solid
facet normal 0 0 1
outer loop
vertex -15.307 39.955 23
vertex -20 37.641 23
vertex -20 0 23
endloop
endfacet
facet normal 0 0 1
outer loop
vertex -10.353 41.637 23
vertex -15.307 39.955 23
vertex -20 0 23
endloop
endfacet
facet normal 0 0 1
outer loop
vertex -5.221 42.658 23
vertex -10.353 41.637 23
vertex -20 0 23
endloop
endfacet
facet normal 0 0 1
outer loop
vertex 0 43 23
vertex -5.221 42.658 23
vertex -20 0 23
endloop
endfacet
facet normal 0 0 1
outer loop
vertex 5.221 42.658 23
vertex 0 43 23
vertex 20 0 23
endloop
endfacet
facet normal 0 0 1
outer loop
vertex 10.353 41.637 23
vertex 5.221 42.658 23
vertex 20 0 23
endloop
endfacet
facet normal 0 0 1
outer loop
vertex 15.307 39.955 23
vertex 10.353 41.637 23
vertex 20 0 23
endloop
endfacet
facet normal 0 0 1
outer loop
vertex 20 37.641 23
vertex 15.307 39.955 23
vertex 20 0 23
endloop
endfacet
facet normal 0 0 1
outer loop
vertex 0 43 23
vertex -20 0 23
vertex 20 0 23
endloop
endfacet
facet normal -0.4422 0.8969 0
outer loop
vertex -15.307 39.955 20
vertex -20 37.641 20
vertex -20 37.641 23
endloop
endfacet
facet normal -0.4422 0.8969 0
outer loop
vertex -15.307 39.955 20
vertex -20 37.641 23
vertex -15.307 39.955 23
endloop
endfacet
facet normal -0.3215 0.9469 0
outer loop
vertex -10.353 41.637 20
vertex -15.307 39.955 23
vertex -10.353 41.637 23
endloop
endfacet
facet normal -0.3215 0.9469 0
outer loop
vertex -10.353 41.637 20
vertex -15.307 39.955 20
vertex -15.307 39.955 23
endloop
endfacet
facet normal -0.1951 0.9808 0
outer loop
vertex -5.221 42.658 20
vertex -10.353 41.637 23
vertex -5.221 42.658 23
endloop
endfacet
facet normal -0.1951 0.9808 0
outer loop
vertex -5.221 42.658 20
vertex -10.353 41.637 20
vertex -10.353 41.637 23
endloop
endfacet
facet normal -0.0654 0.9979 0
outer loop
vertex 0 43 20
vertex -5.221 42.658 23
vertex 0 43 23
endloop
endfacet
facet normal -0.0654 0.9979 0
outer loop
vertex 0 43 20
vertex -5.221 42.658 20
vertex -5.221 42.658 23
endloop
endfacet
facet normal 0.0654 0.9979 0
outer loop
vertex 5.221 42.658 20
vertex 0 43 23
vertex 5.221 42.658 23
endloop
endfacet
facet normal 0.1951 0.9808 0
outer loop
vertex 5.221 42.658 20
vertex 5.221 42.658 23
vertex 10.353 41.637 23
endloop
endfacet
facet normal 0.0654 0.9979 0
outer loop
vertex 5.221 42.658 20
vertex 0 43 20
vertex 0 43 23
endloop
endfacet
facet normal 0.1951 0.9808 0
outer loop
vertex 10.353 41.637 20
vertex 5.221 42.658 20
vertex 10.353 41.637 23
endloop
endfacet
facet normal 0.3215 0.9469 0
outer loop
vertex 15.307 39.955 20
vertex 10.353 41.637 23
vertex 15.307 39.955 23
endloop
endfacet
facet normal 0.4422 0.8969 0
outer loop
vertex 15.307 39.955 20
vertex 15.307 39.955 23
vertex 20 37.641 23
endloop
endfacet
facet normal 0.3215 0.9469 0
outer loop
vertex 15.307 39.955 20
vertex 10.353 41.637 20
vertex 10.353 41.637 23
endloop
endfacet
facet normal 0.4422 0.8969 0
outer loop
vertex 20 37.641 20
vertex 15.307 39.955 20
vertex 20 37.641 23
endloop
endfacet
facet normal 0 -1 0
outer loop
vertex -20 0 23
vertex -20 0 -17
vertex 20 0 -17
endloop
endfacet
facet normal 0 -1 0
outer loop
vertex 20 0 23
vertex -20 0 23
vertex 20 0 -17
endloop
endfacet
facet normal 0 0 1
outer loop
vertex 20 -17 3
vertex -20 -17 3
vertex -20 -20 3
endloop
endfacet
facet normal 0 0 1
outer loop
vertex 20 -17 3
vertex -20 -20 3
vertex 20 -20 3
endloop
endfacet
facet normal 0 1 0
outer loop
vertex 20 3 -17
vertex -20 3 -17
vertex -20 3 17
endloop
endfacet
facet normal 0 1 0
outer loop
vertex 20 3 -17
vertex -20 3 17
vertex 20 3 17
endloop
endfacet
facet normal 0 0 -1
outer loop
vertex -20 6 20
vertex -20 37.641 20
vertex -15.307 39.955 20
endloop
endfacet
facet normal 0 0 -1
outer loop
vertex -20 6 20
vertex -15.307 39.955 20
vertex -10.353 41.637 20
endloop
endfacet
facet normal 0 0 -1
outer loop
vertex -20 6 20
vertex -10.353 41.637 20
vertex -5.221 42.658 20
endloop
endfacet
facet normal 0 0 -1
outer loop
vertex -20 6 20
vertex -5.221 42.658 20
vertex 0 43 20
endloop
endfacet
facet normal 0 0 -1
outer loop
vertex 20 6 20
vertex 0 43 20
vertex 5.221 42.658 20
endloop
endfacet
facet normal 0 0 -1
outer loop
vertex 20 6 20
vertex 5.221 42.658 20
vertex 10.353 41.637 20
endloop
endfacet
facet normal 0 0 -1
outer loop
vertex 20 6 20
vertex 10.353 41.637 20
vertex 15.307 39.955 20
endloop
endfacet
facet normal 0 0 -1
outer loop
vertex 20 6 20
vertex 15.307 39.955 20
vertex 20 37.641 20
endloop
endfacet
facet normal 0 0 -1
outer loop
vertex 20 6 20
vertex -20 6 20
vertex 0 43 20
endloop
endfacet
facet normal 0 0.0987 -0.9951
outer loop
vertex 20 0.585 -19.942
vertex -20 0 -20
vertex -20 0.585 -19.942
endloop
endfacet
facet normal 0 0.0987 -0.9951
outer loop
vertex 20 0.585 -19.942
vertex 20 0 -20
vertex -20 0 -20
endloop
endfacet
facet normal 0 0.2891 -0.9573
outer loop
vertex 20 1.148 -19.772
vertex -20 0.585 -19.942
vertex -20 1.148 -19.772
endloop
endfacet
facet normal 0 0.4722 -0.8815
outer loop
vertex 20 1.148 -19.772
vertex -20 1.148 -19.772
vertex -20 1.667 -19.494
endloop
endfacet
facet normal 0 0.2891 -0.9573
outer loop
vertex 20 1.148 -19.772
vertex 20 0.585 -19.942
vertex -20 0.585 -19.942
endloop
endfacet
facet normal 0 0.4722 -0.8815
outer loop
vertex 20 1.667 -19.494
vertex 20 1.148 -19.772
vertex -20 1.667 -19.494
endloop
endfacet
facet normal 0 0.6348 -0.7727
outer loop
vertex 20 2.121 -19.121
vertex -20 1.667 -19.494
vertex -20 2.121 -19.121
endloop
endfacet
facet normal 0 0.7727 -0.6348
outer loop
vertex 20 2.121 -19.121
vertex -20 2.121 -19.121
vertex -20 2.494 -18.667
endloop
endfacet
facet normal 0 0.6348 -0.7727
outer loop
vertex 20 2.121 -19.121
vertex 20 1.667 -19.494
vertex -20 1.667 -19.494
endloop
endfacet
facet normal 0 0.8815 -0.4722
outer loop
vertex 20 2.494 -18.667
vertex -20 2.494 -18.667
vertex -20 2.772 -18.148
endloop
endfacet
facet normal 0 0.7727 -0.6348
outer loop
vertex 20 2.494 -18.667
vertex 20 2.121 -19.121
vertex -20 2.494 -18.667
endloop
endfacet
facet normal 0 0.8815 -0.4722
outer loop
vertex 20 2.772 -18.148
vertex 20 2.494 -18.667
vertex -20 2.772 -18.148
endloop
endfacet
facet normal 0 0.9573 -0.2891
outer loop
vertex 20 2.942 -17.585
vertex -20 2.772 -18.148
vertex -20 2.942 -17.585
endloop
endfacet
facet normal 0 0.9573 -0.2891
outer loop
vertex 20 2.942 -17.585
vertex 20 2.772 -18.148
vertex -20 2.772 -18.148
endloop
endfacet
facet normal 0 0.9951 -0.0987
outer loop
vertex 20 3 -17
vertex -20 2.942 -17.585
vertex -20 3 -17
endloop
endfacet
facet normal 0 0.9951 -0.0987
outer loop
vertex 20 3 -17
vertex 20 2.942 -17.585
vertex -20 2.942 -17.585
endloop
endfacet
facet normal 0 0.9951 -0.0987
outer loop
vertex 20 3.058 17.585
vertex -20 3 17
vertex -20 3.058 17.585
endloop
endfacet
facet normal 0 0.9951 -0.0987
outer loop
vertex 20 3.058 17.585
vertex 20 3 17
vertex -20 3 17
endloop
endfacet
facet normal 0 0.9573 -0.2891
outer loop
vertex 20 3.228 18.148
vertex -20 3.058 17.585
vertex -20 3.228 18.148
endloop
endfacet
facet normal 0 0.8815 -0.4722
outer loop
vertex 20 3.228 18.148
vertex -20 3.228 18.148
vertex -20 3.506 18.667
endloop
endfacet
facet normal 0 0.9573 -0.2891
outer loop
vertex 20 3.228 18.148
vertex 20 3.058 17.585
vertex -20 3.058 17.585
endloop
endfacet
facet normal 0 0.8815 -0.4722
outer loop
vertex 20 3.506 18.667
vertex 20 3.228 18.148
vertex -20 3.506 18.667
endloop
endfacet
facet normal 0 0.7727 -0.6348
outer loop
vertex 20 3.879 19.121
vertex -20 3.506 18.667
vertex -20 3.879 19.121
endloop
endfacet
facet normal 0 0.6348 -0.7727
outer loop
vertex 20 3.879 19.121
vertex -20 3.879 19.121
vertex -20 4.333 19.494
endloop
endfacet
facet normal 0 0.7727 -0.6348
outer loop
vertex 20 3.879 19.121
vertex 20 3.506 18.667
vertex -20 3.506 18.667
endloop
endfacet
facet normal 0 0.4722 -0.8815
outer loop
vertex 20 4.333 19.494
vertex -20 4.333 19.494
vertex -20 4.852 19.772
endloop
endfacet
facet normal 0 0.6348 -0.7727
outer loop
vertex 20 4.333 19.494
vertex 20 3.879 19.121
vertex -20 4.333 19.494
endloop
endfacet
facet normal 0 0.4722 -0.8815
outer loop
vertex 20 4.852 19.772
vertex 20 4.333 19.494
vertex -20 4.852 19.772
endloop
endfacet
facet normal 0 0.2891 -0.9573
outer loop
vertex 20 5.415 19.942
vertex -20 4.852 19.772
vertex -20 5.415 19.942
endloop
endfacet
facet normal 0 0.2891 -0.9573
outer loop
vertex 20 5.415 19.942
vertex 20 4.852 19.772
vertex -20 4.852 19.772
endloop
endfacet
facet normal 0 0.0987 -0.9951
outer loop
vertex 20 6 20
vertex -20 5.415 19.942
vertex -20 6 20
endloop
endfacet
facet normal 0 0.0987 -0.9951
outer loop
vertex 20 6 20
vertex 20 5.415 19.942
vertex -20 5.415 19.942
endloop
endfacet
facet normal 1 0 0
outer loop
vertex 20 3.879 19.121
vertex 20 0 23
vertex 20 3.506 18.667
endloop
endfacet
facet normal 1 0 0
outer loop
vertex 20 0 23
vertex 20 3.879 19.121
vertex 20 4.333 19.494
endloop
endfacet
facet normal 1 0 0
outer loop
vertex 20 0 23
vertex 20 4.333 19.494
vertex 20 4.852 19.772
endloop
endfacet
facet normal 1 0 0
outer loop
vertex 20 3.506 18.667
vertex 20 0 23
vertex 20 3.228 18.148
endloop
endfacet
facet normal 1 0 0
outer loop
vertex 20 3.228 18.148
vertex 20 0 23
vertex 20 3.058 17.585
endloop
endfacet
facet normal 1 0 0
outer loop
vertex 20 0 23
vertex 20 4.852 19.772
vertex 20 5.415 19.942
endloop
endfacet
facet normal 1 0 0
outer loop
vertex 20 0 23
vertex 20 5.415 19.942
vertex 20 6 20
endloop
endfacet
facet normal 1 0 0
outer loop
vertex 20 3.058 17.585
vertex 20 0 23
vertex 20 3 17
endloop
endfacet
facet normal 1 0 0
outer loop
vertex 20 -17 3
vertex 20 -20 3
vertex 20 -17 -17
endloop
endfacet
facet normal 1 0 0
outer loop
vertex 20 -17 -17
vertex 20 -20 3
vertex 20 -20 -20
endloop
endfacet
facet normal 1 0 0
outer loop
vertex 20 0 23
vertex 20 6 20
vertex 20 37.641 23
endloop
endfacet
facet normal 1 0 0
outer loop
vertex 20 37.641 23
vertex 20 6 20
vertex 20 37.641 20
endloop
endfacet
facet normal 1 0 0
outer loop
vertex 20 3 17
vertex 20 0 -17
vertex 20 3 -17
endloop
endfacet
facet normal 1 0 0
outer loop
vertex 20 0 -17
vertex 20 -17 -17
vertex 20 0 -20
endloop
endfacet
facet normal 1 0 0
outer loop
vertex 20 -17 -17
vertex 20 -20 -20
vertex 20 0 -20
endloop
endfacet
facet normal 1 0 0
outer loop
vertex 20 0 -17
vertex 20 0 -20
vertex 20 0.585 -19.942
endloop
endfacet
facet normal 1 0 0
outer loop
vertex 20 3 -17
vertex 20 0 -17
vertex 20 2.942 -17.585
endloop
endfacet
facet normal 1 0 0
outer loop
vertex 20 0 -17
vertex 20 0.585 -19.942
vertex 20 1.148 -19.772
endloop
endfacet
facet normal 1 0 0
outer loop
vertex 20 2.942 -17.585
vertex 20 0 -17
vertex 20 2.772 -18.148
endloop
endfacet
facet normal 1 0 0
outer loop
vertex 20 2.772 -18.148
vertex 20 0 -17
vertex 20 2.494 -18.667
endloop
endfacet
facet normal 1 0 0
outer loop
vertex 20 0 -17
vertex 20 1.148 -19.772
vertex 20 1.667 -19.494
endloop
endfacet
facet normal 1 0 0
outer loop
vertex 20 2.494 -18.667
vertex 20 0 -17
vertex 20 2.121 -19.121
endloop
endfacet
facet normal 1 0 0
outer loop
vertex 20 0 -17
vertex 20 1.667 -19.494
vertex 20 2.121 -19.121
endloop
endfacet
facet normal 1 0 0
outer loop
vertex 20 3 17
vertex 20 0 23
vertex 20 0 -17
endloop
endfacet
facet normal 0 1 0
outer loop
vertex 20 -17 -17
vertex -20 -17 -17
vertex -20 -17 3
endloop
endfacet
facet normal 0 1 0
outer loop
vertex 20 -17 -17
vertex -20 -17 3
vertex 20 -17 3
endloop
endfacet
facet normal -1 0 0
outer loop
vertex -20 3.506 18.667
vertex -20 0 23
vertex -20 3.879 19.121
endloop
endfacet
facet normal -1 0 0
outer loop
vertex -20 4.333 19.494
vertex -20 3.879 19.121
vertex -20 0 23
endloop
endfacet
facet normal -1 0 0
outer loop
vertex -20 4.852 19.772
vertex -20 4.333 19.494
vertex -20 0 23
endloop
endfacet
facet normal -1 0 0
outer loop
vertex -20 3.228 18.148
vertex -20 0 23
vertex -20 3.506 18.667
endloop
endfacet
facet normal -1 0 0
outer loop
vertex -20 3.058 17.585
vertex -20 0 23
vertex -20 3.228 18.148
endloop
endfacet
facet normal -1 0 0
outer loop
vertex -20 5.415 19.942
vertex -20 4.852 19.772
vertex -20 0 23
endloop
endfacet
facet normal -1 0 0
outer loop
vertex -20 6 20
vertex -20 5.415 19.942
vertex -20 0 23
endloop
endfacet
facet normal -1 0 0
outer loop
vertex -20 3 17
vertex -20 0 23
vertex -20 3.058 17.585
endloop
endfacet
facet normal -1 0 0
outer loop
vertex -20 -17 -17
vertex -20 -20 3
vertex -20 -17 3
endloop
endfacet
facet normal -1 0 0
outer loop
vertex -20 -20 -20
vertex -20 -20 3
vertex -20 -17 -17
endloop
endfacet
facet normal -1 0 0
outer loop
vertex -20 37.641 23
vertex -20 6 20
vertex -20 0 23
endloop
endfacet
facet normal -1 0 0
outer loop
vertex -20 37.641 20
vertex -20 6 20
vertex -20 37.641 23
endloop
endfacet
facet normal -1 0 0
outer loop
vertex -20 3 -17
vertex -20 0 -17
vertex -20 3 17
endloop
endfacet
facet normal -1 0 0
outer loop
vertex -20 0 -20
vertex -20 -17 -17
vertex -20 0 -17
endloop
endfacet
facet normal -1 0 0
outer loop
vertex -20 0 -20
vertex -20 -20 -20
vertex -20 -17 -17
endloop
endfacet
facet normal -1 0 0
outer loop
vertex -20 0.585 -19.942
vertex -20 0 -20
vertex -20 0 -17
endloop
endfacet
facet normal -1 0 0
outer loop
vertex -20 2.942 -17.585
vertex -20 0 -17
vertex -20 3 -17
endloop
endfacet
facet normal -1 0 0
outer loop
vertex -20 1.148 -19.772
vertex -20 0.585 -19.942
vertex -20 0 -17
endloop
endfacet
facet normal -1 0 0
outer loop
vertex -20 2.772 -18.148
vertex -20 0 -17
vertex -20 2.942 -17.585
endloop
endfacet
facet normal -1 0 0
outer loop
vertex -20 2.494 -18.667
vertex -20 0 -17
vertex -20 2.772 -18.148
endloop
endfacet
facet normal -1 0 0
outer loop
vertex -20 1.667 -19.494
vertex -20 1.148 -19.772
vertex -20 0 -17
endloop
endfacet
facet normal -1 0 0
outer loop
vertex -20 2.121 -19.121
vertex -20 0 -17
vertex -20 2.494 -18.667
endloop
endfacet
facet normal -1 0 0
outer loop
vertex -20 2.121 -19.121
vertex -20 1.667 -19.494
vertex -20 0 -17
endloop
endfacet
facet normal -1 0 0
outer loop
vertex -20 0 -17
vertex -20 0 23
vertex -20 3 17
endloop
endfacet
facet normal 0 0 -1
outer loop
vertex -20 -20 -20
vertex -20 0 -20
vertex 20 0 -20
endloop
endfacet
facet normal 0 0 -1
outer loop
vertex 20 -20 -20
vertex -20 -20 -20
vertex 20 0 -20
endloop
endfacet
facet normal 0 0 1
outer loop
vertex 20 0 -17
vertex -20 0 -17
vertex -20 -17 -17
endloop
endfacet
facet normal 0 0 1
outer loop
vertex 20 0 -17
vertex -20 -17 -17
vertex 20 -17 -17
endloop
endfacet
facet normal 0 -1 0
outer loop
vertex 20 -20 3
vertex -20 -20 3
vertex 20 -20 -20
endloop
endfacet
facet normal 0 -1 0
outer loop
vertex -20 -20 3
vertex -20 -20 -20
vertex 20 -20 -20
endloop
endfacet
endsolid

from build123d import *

# Parameters (mm, degrees)
SKETCH1_W           = 40
SKETCH1_H           = 40
BOSS_EXTRUDE1_DEPTH = 3
SKETCH2_W           = 40
SKETCH2_H           = 3
BOSS_EXTRUDE2_DEPTH = 53
SKETCH3_W           = 40
SKETCH3_H           = 3
BOSS_EXTRUDE3_DEPTH = 20
CUT_EXTRUDE1_REACH  = 5
FILLET1_R           = 3
SKETCH5_W           = 40
SKETCH5_H           = 3
BOSS_EXTRUDE4_DEPTH = 20


with BuildPart() as part:
    # Sketch1 → Boss-Extrude1 (new body)
    with BuildSketch(Plane(origin=(0, 0, 0), x_dir=(1, 0, 0), z_dir=(0, 1, 0))):
        Rectangle(SKETCH1_W, SKETCH1_H)
    extrude(amount=BOSS_EXTRUDE1_DEPTH)

    # Sketch2 → Boss-Extrude2 (add)
    with BuildSketch(Plane(origin=(0, 0, 0), x_dir=(1, 0, 0), z_dir=(0, 1, 0))):
        with Locations((0, -21.5)):
            Rectangle(SKETCH2_W, SKETCH2_H)
    extrude(amount=BOSS_EXTRUDE2_DEPTH)

    # Sketch3 → Boss-Extrude3 (add)
    with BuildSketch(Plane.XZ):
        with Locations((0, -18.5)):
            Rectangle(SKETCH3_W, SKETCH3_H)
    extrude(amount=BOSS_EXTRUDE3_DEPTH)

    # Sketch4 → Cut-Extrude1 (cut, up to next)
    with BuildSketch(Plane(origin=(0, 0, 20), x_dir=(-1, 0, 0), z_dir=(0, 0, -1)), mode=Mode.PRIVATE) as cut_extrude1_sk1:
        with BuildLine():
            Line((-20, 37.641016151), (-20, 53))
            Line((-20, 53), (20, 53))
            Line((20, 53), (20, 37.641016151))
            ThreePointArc((20, 37.641016151), (0, 43), (-20, 37.641016151))
        make_face()
    cut_extrude1_tool1 = extrude(cut_extrude1_sk1.sketch, amount=-CUT_EXTRUDE1_REACH, mode=Mode.PRIVATE) & part.part
    add(cut_extrude1_tool1.solids().sort_by_distance((0, 47.025808, 20))[0], mode=Mode.SUBTRACT)

    # Fillet1
    fillet1_edges = [part.edges().sort_by_distance(p)[0] for p in [
        (0, 3, 20),
        (0, 3, -20),
    ]]
    fillet(fillet1_edges, radius=FILLET1_R)

    # Sketch5 → Boss-Extrude4 (add)
    with BuildSketch(Plane.XY.offset(-17)):
        with Locations((0, -18.5)):
            Rectangle(SKETCH5_W, SKETCH5_H)
    extrude(amount=BOSS_EXTRUDE4_DEPTH)


solid = part.part
